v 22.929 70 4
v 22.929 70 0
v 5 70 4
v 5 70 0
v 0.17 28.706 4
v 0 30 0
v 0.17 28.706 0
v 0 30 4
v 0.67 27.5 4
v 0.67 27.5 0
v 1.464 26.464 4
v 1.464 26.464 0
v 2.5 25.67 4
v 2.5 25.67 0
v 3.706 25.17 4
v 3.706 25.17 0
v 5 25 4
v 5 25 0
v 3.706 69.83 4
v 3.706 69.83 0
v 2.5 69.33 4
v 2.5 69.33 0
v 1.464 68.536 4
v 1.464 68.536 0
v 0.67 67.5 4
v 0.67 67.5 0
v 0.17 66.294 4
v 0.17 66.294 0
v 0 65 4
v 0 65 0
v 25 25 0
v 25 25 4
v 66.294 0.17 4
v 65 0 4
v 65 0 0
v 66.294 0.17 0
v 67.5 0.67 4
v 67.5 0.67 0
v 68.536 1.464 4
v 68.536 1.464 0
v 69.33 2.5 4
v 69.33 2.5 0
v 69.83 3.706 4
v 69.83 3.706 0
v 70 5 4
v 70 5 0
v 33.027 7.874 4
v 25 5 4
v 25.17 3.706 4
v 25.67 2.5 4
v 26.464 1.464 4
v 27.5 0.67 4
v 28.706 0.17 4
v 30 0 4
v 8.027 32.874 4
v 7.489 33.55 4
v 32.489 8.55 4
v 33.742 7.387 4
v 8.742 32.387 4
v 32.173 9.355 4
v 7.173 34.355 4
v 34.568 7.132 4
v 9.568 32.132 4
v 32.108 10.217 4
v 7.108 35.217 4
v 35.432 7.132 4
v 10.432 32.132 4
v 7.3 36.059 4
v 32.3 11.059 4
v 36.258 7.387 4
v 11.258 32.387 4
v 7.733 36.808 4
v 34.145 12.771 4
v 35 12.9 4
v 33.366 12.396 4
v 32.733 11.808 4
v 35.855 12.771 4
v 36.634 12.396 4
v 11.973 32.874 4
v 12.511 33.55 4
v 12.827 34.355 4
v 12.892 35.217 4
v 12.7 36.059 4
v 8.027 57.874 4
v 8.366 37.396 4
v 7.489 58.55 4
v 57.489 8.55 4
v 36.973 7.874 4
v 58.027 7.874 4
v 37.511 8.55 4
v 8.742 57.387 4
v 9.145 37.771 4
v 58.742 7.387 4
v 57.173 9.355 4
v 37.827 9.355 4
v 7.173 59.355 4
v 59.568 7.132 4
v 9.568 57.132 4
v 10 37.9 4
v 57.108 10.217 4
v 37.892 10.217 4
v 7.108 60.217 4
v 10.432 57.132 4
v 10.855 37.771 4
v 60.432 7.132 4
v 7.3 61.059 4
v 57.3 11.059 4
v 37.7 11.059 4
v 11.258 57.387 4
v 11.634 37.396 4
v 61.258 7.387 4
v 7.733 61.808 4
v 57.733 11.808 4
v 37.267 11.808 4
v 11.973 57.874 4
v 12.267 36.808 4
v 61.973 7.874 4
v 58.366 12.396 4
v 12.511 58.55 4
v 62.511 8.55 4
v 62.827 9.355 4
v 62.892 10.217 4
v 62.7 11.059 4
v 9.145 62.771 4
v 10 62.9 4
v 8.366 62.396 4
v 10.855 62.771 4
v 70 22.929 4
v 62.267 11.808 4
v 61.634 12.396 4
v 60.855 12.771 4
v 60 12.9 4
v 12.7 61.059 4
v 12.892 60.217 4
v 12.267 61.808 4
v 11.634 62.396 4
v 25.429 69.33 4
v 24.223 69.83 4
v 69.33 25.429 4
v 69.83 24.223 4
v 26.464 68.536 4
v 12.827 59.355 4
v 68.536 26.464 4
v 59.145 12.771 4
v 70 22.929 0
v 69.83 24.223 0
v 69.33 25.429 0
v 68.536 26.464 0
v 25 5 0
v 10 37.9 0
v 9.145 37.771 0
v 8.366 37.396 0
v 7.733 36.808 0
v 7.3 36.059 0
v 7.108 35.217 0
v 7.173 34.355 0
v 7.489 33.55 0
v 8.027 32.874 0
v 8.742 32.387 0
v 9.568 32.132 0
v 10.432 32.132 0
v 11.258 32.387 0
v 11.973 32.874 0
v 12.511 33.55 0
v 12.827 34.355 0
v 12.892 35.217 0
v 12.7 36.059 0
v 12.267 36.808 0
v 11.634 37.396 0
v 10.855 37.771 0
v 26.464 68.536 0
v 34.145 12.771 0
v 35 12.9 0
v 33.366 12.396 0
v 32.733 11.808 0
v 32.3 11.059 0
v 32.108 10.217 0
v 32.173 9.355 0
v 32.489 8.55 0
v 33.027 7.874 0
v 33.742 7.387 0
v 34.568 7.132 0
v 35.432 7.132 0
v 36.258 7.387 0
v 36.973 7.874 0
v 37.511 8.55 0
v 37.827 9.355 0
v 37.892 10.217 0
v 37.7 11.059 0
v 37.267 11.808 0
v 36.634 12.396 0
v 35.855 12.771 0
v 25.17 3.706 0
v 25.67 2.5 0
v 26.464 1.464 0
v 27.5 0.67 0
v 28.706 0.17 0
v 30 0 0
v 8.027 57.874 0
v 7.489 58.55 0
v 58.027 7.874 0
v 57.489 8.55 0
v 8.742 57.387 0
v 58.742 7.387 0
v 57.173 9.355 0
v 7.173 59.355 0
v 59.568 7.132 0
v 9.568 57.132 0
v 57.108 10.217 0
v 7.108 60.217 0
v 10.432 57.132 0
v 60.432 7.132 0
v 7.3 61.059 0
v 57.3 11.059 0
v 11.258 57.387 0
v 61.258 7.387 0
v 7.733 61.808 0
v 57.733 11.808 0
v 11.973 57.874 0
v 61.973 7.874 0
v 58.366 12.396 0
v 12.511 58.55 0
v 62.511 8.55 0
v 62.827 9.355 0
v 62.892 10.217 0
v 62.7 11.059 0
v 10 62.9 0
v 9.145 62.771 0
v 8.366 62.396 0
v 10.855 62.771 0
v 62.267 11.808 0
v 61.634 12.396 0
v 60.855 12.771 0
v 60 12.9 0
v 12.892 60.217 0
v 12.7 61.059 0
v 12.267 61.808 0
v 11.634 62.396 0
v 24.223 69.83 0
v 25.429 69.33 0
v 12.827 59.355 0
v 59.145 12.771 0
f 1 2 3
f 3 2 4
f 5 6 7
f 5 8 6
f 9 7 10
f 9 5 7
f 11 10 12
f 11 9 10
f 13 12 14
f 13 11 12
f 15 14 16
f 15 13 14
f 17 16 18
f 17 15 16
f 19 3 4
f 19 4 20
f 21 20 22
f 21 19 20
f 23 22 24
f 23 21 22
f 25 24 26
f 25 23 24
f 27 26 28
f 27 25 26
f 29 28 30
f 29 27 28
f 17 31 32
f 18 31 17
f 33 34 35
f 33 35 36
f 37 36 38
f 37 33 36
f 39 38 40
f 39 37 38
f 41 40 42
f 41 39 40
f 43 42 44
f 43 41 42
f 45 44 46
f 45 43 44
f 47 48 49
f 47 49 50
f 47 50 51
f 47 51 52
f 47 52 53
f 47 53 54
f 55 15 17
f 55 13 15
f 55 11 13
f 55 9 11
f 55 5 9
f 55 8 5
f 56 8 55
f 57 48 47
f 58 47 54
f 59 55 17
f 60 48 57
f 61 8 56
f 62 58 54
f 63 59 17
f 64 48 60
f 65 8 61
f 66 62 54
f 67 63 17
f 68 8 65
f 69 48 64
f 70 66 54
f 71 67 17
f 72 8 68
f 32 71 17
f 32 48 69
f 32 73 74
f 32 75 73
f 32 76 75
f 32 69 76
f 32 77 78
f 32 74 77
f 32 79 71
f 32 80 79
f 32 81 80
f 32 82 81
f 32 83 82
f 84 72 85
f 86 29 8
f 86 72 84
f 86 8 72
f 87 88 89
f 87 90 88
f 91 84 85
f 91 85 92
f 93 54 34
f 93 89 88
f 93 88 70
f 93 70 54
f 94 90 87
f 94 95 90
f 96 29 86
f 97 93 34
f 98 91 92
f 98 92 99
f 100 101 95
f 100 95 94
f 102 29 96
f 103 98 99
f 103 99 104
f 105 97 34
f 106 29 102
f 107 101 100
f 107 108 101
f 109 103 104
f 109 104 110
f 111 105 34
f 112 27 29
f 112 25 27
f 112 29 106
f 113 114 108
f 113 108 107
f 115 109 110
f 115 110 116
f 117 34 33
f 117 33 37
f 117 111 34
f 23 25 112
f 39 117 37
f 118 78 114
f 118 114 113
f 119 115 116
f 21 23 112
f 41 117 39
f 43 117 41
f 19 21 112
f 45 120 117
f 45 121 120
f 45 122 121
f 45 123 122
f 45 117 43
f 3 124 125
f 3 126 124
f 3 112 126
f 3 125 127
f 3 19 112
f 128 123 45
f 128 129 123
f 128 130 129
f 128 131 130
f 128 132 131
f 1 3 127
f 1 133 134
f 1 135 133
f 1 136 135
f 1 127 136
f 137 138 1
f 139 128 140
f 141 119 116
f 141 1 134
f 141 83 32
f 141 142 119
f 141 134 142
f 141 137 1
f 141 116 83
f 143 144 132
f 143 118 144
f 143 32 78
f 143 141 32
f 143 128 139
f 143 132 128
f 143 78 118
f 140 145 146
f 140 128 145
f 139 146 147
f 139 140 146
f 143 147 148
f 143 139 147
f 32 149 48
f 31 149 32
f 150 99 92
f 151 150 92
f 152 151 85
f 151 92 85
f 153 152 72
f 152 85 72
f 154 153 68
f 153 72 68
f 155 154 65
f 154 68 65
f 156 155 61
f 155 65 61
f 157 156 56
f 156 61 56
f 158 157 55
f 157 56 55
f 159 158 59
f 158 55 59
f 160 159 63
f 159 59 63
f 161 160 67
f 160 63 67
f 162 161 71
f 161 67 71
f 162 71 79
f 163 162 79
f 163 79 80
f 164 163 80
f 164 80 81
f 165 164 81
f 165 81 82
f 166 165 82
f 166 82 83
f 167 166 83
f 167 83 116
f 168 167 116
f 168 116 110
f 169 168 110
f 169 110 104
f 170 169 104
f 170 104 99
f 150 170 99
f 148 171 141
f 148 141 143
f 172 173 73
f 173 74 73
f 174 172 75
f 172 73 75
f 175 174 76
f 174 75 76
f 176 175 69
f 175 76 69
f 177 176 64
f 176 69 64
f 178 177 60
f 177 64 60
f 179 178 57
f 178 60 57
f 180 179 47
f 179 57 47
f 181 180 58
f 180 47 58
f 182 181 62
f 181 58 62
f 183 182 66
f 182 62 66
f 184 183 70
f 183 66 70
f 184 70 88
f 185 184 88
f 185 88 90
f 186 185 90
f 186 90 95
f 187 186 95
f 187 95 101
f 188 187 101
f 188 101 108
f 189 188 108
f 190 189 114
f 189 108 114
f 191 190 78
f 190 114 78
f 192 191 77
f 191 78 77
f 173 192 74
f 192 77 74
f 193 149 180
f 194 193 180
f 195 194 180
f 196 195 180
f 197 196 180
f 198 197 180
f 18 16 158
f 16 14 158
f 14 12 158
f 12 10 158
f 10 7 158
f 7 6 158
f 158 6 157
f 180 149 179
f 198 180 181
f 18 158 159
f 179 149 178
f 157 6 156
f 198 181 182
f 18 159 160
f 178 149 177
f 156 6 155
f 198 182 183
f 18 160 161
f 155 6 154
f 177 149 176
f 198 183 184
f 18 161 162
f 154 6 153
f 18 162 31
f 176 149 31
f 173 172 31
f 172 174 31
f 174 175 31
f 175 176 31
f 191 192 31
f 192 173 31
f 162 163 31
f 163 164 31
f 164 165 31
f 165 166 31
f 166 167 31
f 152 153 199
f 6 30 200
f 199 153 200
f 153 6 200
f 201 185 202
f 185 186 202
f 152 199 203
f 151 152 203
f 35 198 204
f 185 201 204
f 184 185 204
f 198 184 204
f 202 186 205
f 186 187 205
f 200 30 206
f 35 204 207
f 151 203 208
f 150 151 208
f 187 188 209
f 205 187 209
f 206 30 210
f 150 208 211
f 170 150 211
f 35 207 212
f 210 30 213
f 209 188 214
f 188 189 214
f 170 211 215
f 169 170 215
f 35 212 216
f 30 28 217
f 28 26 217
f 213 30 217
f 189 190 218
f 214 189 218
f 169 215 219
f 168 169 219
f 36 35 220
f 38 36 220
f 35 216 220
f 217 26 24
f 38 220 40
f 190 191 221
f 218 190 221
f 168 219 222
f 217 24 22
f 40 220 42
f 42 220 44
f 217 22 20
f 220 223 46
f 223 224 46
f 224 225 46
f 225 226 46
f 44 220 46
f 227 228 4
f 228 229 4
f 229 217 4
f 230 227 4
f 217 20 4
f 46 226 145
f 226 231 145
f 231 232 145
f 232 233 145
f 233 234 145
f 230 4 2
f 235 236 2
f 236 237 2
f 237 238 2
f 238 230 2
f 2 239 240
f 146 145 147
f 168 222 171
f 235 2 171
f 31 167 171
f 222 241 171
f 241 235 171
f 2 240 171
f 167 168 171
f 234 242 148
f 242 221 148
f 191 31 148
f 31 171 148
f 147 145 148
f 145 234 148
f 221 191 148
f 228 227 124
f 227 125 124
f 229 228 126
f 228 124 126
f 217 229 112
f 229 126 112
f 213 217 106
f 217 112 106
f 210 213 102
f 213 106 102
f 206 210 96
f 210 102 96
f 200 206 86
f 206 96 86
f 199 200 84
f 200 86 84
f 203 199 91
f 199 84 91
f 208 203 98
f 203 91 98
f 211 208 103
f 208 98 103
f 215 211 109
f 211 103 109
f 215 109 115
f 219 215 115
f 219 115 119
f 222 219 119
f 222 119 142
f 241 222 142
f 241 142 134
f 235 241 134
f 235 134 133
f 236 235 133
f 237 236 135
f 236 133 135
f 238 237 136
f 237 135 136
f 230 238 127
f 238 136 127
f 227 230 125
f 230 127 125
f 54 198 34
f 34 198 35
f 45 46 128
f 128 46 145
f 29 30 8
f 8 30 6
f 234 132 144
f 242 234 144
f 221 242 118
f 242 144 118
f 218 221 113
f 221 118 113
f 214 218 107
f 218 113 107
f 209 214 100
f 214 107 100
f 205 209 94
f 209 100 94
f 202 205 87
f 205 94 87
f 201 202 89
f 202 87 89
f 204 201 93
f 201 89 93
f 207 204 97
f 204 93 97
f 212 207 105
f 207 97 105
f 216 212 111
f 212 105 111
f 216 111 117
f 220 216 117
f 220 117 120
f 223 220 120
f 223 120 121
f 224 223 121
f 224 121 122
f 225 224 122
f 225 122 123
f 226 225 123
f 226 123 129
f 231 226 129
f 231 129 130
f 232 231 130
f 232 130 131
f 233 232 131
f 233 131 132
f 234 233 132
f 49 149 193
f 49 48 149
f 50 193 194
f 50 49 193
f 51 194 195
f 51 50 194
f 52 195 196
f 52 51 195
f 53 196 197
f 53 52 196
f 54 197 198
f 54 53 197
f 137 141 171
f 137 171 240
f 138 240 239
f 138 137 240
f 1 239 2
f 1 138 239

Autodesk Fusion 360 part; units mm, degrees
sketch "Bracket Shape" plane through (0, 0, 0) normal (0, 0, 1) x (1, 0, 0) in component "Bracket"
  line L0 (0, 0) -> (70, 0)
  line L1 (70, 0) -> (70, 70)
  line L2 (70, 70) -> (0, 70)
  line L3 (0, 70) -> (0, 0)
  line L4 (0, 0) -> (25, 0)
  line L5 (25, 0) -> (25, 25)
  line L6 (25, 25) -> (0, 25)
  line L7 (0, 25) -> (0, 0)
  line L8 (25, 25) -> (25, 70)
  line L9 (25, 25) -> (70, 25)
  line L10 (25, 70) -> (70, 25)
  line L11 (0, 70) -> (10, 70)
  line L12 (10, 70) -> (10, 25) construction
  line L13 (70, 0) -> (70, 10) construction
  line L14 (70, 10) -> (25, 10) construction
  line L15 (70, 0) -> (60, 0) construction
  line L16 (25, 0) -> (35, 0) construction
  line L17 (35, 0) -> (35, 10) construction
  line L18 (60, 0) -> (60, 10) construction
  line L19 (0, 25) -> (0, 35) construction
  line L20 (0, 70) -> (0, 60) construction
  line L21 (0, 70) -> (0, 60) construction
  line L22 (0, 35) -> (10, 35) construction
  line L23 (0, 60) -> (10, 60) construction
  line L24 (25, 10) -> (0, 10) construction
  line L25 (10, 25) -> (10, 0) construction
  dimension "d1" = 70
  dimension "d2" = 70
  dimension "d3" = 25
  dimension "d4" = 25
  dimension "d7" = 10
  dimension "d8" = 10
  dimension "d9" = 10
  dimension "d10" = 10
  dimension "d11" = 10
  dimension "d12" = 10
extrude "Extrude1" add sketch "Bracket Shape" along normal blind 4 contours L0 L1 L5 L9 | L2 L3 L6 L8 L11 | L8 L9 L10 in component "Bracket"
hole "Hole1" at (10, 60, 0) direction (0, 0, 1) diameter 5.8 end through all in component "Bracket"
hole "Hole2" at (10, 35, 0) direction (0, 0, 1) diameter 5.8 end through all in component "Bracket"
hole "Hole3" at (35, 10, 0) direction (0, 0, 1) diameter 5.8 end through all in component "Bracket"
hole "Hole4" at (60, 10, 0) direction (0, 0, 1) diameter 5.8 end through all in component "Bracket"
fillet "Fillet1" radius 5 6 edges at (70, 0, 2) (25, 0, 2) (0, 25, 2) (0, 70, 2) (25, 70, 2) (70, 25, 2) in component "Bracket"
component "Bracket" placed x (1, 0, 0) y (0, 1, 0) z (0, 0, 1) at (0, 0, 0)
